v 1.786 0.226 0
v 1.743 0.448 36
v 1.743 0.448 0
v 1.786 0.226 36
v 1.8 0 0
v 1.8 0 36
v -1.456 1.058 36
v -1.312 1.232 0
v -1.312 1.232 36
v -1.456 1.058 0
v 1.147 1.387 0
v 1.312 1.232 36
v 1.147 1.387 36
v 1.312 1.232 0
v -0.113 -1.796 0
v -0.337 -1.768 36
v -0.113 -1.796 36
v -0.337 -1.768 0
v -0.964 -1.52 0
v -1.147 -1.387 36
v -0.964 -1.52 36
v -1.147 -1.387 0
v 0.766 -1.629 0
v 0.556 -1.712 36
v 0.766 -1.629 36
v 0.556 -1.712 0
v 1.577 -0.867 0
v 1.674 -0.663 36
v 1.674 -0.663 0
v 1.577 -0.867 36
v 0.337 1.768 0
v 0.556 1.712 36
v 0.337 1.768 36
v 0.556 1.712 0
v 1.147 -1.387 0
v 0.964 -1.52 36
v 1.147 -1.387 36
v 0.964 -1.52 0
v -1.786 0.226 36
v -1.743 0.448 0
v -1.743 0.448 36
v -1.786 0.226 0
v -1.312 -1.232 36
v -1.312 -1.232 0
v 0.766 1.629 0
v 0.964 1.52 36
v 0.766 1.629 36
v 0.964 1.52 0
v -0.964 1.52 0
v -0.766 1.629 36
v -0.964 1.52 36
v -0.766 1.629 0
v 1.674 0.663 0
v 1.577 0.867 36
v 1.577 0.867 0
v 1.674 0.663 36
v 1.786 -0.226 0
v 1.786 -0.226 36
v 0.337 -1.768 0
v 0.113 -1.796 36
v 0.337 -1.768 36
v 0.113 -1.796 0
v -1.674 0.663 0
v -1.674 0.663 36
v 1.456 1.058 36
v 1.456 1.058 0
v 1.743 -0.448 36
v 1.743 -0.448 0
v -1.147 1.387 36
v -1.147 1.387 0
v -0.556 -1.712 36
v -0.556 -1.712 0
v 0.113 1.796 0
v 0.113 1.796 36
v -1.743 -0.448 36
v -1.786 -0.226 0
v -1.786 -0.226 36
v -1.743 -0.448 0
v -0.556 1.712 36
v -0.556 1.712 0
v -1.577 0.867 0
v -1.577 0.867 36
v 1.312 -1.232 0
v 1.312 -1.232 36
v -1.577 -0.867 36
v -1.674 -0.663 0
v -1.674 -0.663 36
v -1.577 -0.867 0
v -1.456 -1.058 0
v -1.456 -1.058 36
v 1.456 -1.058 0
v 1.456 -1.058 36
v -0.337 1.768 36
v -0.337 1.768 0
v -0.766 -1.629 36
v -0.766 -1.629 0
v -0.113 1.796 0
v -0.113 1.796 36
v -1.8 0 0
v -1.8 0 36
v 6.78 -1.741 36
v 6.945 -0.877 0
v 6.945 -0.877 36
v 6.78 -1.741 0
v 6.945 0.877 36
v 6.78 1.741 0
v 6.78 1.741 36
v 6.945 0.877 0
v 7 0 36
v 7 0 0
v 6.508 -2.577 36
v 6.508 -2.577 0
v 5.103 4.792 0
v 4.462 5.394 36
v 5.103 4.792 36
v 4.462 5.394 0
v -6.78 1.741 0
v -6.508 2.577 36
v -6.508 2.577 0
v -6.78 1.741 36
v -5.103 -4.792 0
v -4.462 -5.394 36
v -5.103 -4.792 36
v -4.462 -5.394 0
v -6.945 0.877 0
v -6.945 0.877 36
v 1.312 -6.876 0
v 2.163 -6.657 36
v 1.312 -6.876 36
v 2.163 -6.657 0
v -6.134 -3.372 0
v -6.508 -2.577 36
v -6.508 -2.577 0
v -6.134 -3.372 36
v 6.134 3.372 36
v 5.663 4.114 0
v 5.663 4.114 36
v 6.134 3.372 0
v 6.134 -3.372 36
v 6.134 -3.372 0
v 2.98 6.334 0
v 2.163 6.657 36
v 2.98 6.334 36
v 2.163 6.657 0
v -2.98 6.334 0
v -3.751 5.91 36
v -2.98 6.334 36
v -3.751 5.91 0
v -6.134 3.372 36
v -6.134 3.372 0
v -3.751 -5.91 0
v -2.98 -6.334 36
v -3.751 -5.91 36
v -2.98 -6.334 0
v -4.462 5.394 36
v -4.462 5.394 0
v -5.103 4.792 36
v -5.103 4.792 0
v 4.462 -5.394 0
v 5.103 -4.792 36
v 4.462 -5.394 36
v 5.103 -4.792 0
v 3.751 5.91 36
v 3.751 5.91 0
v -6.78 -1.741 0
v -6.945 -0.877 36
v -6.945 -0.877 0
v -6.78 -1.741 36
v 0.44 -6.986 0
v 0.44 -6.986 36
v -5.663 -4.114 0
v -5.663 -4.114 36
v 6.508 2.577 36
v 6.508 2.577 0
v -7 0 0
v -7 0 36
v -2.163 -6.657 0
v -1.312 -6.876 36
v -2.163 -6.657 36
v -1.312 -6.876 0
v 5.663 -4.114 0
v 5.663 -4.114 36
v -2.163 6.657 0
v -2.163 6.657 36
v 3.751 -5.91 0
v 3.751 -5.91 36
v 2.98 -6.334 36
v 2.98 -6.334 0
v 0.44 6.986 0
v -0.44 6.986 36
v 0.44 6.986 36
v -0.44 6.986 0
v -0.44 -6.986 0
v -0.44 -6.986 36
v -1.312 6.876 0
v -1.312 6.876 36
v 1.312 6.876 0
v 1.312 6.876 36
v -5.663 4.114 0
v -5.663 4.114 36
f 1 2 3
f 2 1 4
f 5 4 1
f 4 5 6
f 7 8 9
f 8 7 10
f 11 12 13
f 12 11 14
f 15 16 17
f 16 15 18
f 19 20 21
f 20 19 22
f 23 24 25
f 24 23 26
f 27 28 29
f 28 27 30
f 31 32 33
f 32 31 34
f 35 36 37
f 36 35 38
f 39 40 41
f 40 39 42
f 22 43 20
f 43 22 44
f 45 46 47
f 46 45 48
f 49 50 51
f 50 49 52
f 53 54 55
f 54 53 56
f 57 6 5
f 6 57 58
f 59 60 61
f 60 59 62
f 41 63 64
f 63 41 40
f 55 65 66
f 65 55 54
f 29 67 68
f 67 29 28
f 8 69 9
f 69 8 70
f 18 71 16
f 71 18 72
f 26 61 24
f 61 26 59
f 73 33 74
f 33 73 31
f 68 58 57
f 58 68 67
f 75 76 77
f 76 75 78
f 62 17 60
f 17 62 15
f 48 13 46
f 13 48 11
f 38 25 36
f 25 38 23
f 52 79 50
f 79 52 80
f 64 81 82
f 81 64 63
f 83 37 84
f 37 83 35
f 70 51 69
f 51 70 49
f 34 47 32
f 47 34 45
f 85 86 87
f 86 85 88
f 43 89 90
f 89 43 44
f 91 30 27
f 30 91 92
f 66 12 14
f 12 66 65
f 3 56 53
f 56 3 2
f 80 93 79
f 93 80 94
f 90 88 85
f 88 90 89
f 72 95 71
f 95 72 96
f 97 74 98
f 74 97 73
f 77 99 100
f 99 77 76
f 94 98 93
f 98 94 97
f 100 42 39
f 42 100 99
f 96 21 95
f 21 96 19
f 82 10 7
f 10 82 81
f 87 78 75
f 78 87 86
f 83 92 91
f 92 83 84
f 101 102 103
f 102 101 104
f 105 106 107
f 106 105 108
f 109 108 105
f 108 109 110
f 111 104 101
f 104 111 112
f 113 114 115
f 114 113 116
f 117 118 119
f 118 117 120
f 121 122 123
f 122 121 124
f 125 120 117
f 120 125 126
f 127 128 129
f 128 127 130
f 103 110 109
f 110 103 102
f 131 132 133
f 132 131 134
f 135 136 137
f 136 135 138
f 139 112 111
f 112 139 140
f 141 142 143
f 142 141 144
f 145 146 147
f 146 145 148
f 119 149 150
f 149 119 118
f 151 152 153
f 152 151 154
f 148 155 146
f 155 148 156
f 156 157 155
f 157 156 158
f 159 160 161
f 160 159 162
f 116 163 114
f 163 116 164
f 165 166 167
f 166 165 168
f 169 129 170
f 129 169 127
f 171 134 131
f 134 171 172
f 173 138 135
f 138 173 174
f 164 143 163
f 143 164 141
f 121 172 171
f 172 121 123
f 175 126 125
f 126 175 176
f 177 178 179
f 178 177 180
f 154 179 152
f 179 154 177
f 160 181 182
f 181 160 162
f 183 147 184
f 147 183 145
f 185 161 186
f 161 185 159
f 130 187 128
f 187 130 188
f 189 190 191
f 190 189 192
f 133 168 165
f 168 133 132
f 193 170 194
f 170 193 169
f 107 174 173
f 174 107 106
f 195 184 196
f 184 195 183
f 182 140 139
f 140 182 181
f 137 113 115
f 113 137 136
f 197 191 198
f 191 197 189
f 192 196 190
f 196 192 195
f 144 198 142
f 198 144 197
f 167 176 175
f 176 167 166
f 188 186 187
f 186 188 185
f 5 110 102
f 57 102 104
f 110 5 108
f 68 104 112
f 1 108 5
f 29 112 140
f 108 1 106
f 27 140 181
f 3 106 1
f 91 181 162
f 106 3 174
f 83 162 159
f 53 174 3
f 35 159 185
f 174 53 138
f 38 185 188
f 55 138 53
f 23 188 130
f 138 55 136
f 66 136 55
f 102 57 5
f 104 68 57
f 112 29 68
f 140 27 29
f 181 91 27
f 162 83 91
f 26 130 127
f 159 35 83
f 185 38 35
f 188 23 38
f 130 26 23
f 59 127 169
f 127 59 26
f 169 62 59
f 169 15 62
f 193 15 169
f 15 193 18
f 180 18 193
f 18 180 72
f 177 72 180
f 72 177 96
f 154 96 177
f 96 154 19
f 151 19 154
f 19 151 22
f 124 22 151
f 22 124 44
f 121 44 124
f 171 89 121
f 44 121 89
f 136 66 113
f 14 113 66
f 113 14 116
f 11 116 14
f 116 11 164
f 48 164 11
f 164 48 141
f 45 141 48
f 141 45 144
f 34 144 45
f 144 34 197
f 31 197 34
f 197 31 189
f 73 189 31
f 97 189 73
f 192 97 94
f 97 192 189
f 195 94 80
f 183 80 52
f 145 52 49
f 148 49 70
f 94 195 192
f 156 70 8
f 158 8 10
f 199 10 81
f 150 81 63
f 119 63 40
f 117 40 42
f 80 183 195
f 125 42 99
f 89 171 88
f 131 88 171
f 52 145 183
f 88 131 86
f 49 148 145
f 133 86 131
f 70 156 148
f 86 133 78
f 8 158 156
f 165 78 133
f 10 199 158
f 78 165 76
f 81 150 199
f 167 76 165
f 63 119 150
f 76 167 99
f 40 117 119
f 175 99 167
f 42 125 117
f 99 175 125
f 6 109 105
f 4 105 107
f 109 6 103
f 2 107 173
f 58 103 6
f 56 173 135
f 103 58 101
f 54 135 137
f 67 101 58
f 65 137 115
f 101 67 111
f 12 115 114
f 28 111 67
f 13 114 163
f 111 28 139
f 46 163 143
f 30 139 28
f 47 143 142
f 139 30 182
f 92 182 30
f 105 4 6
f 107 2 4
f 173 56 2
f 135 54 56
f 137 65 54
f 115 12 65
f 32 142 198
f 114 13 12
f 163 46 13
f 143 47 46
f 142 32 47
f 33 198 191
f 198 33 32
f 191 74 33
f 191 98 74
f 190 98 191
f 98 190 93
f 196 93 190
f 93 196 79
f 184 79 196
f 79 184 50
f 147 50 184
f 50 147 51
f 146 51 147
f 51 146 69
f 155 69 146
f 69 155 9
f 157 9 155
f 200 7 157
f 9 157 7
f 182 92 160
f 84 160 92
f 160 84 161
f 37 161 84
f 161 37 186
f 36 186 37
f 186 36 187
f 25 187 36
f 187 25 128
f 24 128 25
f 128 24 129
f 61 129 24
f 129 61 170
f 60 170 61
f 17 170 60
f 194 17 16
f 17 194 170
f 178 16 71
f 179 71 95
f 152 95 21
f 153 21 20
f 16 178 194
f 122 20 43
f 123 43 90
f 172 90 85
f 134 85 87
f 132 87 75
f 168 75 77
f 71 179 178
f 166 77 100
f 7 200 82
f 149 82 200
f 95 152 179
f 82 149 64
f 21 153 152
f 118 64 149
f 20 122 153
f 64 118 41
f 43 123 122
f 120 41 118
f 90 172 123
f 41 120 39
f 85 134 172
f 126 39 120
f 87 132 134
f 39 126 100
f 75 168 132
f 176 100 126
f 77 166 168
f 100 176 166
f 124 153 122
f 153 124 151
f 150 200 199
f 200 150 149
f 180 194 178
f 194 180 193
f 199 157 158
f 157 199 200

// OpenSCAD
$fn = 50;


difference() {
	union() {
		cylinder(h = 36, r = 7.0000000000);
	}
	union() {
		translate(v = [0, 0, -100]) {
			cylinder(h = 200, r = 1.8000000000);
		}
		translate(v = [0, 0, -100]) {
			cylinder(h = 200, r = 1.8000000000);
		}
	}
}
